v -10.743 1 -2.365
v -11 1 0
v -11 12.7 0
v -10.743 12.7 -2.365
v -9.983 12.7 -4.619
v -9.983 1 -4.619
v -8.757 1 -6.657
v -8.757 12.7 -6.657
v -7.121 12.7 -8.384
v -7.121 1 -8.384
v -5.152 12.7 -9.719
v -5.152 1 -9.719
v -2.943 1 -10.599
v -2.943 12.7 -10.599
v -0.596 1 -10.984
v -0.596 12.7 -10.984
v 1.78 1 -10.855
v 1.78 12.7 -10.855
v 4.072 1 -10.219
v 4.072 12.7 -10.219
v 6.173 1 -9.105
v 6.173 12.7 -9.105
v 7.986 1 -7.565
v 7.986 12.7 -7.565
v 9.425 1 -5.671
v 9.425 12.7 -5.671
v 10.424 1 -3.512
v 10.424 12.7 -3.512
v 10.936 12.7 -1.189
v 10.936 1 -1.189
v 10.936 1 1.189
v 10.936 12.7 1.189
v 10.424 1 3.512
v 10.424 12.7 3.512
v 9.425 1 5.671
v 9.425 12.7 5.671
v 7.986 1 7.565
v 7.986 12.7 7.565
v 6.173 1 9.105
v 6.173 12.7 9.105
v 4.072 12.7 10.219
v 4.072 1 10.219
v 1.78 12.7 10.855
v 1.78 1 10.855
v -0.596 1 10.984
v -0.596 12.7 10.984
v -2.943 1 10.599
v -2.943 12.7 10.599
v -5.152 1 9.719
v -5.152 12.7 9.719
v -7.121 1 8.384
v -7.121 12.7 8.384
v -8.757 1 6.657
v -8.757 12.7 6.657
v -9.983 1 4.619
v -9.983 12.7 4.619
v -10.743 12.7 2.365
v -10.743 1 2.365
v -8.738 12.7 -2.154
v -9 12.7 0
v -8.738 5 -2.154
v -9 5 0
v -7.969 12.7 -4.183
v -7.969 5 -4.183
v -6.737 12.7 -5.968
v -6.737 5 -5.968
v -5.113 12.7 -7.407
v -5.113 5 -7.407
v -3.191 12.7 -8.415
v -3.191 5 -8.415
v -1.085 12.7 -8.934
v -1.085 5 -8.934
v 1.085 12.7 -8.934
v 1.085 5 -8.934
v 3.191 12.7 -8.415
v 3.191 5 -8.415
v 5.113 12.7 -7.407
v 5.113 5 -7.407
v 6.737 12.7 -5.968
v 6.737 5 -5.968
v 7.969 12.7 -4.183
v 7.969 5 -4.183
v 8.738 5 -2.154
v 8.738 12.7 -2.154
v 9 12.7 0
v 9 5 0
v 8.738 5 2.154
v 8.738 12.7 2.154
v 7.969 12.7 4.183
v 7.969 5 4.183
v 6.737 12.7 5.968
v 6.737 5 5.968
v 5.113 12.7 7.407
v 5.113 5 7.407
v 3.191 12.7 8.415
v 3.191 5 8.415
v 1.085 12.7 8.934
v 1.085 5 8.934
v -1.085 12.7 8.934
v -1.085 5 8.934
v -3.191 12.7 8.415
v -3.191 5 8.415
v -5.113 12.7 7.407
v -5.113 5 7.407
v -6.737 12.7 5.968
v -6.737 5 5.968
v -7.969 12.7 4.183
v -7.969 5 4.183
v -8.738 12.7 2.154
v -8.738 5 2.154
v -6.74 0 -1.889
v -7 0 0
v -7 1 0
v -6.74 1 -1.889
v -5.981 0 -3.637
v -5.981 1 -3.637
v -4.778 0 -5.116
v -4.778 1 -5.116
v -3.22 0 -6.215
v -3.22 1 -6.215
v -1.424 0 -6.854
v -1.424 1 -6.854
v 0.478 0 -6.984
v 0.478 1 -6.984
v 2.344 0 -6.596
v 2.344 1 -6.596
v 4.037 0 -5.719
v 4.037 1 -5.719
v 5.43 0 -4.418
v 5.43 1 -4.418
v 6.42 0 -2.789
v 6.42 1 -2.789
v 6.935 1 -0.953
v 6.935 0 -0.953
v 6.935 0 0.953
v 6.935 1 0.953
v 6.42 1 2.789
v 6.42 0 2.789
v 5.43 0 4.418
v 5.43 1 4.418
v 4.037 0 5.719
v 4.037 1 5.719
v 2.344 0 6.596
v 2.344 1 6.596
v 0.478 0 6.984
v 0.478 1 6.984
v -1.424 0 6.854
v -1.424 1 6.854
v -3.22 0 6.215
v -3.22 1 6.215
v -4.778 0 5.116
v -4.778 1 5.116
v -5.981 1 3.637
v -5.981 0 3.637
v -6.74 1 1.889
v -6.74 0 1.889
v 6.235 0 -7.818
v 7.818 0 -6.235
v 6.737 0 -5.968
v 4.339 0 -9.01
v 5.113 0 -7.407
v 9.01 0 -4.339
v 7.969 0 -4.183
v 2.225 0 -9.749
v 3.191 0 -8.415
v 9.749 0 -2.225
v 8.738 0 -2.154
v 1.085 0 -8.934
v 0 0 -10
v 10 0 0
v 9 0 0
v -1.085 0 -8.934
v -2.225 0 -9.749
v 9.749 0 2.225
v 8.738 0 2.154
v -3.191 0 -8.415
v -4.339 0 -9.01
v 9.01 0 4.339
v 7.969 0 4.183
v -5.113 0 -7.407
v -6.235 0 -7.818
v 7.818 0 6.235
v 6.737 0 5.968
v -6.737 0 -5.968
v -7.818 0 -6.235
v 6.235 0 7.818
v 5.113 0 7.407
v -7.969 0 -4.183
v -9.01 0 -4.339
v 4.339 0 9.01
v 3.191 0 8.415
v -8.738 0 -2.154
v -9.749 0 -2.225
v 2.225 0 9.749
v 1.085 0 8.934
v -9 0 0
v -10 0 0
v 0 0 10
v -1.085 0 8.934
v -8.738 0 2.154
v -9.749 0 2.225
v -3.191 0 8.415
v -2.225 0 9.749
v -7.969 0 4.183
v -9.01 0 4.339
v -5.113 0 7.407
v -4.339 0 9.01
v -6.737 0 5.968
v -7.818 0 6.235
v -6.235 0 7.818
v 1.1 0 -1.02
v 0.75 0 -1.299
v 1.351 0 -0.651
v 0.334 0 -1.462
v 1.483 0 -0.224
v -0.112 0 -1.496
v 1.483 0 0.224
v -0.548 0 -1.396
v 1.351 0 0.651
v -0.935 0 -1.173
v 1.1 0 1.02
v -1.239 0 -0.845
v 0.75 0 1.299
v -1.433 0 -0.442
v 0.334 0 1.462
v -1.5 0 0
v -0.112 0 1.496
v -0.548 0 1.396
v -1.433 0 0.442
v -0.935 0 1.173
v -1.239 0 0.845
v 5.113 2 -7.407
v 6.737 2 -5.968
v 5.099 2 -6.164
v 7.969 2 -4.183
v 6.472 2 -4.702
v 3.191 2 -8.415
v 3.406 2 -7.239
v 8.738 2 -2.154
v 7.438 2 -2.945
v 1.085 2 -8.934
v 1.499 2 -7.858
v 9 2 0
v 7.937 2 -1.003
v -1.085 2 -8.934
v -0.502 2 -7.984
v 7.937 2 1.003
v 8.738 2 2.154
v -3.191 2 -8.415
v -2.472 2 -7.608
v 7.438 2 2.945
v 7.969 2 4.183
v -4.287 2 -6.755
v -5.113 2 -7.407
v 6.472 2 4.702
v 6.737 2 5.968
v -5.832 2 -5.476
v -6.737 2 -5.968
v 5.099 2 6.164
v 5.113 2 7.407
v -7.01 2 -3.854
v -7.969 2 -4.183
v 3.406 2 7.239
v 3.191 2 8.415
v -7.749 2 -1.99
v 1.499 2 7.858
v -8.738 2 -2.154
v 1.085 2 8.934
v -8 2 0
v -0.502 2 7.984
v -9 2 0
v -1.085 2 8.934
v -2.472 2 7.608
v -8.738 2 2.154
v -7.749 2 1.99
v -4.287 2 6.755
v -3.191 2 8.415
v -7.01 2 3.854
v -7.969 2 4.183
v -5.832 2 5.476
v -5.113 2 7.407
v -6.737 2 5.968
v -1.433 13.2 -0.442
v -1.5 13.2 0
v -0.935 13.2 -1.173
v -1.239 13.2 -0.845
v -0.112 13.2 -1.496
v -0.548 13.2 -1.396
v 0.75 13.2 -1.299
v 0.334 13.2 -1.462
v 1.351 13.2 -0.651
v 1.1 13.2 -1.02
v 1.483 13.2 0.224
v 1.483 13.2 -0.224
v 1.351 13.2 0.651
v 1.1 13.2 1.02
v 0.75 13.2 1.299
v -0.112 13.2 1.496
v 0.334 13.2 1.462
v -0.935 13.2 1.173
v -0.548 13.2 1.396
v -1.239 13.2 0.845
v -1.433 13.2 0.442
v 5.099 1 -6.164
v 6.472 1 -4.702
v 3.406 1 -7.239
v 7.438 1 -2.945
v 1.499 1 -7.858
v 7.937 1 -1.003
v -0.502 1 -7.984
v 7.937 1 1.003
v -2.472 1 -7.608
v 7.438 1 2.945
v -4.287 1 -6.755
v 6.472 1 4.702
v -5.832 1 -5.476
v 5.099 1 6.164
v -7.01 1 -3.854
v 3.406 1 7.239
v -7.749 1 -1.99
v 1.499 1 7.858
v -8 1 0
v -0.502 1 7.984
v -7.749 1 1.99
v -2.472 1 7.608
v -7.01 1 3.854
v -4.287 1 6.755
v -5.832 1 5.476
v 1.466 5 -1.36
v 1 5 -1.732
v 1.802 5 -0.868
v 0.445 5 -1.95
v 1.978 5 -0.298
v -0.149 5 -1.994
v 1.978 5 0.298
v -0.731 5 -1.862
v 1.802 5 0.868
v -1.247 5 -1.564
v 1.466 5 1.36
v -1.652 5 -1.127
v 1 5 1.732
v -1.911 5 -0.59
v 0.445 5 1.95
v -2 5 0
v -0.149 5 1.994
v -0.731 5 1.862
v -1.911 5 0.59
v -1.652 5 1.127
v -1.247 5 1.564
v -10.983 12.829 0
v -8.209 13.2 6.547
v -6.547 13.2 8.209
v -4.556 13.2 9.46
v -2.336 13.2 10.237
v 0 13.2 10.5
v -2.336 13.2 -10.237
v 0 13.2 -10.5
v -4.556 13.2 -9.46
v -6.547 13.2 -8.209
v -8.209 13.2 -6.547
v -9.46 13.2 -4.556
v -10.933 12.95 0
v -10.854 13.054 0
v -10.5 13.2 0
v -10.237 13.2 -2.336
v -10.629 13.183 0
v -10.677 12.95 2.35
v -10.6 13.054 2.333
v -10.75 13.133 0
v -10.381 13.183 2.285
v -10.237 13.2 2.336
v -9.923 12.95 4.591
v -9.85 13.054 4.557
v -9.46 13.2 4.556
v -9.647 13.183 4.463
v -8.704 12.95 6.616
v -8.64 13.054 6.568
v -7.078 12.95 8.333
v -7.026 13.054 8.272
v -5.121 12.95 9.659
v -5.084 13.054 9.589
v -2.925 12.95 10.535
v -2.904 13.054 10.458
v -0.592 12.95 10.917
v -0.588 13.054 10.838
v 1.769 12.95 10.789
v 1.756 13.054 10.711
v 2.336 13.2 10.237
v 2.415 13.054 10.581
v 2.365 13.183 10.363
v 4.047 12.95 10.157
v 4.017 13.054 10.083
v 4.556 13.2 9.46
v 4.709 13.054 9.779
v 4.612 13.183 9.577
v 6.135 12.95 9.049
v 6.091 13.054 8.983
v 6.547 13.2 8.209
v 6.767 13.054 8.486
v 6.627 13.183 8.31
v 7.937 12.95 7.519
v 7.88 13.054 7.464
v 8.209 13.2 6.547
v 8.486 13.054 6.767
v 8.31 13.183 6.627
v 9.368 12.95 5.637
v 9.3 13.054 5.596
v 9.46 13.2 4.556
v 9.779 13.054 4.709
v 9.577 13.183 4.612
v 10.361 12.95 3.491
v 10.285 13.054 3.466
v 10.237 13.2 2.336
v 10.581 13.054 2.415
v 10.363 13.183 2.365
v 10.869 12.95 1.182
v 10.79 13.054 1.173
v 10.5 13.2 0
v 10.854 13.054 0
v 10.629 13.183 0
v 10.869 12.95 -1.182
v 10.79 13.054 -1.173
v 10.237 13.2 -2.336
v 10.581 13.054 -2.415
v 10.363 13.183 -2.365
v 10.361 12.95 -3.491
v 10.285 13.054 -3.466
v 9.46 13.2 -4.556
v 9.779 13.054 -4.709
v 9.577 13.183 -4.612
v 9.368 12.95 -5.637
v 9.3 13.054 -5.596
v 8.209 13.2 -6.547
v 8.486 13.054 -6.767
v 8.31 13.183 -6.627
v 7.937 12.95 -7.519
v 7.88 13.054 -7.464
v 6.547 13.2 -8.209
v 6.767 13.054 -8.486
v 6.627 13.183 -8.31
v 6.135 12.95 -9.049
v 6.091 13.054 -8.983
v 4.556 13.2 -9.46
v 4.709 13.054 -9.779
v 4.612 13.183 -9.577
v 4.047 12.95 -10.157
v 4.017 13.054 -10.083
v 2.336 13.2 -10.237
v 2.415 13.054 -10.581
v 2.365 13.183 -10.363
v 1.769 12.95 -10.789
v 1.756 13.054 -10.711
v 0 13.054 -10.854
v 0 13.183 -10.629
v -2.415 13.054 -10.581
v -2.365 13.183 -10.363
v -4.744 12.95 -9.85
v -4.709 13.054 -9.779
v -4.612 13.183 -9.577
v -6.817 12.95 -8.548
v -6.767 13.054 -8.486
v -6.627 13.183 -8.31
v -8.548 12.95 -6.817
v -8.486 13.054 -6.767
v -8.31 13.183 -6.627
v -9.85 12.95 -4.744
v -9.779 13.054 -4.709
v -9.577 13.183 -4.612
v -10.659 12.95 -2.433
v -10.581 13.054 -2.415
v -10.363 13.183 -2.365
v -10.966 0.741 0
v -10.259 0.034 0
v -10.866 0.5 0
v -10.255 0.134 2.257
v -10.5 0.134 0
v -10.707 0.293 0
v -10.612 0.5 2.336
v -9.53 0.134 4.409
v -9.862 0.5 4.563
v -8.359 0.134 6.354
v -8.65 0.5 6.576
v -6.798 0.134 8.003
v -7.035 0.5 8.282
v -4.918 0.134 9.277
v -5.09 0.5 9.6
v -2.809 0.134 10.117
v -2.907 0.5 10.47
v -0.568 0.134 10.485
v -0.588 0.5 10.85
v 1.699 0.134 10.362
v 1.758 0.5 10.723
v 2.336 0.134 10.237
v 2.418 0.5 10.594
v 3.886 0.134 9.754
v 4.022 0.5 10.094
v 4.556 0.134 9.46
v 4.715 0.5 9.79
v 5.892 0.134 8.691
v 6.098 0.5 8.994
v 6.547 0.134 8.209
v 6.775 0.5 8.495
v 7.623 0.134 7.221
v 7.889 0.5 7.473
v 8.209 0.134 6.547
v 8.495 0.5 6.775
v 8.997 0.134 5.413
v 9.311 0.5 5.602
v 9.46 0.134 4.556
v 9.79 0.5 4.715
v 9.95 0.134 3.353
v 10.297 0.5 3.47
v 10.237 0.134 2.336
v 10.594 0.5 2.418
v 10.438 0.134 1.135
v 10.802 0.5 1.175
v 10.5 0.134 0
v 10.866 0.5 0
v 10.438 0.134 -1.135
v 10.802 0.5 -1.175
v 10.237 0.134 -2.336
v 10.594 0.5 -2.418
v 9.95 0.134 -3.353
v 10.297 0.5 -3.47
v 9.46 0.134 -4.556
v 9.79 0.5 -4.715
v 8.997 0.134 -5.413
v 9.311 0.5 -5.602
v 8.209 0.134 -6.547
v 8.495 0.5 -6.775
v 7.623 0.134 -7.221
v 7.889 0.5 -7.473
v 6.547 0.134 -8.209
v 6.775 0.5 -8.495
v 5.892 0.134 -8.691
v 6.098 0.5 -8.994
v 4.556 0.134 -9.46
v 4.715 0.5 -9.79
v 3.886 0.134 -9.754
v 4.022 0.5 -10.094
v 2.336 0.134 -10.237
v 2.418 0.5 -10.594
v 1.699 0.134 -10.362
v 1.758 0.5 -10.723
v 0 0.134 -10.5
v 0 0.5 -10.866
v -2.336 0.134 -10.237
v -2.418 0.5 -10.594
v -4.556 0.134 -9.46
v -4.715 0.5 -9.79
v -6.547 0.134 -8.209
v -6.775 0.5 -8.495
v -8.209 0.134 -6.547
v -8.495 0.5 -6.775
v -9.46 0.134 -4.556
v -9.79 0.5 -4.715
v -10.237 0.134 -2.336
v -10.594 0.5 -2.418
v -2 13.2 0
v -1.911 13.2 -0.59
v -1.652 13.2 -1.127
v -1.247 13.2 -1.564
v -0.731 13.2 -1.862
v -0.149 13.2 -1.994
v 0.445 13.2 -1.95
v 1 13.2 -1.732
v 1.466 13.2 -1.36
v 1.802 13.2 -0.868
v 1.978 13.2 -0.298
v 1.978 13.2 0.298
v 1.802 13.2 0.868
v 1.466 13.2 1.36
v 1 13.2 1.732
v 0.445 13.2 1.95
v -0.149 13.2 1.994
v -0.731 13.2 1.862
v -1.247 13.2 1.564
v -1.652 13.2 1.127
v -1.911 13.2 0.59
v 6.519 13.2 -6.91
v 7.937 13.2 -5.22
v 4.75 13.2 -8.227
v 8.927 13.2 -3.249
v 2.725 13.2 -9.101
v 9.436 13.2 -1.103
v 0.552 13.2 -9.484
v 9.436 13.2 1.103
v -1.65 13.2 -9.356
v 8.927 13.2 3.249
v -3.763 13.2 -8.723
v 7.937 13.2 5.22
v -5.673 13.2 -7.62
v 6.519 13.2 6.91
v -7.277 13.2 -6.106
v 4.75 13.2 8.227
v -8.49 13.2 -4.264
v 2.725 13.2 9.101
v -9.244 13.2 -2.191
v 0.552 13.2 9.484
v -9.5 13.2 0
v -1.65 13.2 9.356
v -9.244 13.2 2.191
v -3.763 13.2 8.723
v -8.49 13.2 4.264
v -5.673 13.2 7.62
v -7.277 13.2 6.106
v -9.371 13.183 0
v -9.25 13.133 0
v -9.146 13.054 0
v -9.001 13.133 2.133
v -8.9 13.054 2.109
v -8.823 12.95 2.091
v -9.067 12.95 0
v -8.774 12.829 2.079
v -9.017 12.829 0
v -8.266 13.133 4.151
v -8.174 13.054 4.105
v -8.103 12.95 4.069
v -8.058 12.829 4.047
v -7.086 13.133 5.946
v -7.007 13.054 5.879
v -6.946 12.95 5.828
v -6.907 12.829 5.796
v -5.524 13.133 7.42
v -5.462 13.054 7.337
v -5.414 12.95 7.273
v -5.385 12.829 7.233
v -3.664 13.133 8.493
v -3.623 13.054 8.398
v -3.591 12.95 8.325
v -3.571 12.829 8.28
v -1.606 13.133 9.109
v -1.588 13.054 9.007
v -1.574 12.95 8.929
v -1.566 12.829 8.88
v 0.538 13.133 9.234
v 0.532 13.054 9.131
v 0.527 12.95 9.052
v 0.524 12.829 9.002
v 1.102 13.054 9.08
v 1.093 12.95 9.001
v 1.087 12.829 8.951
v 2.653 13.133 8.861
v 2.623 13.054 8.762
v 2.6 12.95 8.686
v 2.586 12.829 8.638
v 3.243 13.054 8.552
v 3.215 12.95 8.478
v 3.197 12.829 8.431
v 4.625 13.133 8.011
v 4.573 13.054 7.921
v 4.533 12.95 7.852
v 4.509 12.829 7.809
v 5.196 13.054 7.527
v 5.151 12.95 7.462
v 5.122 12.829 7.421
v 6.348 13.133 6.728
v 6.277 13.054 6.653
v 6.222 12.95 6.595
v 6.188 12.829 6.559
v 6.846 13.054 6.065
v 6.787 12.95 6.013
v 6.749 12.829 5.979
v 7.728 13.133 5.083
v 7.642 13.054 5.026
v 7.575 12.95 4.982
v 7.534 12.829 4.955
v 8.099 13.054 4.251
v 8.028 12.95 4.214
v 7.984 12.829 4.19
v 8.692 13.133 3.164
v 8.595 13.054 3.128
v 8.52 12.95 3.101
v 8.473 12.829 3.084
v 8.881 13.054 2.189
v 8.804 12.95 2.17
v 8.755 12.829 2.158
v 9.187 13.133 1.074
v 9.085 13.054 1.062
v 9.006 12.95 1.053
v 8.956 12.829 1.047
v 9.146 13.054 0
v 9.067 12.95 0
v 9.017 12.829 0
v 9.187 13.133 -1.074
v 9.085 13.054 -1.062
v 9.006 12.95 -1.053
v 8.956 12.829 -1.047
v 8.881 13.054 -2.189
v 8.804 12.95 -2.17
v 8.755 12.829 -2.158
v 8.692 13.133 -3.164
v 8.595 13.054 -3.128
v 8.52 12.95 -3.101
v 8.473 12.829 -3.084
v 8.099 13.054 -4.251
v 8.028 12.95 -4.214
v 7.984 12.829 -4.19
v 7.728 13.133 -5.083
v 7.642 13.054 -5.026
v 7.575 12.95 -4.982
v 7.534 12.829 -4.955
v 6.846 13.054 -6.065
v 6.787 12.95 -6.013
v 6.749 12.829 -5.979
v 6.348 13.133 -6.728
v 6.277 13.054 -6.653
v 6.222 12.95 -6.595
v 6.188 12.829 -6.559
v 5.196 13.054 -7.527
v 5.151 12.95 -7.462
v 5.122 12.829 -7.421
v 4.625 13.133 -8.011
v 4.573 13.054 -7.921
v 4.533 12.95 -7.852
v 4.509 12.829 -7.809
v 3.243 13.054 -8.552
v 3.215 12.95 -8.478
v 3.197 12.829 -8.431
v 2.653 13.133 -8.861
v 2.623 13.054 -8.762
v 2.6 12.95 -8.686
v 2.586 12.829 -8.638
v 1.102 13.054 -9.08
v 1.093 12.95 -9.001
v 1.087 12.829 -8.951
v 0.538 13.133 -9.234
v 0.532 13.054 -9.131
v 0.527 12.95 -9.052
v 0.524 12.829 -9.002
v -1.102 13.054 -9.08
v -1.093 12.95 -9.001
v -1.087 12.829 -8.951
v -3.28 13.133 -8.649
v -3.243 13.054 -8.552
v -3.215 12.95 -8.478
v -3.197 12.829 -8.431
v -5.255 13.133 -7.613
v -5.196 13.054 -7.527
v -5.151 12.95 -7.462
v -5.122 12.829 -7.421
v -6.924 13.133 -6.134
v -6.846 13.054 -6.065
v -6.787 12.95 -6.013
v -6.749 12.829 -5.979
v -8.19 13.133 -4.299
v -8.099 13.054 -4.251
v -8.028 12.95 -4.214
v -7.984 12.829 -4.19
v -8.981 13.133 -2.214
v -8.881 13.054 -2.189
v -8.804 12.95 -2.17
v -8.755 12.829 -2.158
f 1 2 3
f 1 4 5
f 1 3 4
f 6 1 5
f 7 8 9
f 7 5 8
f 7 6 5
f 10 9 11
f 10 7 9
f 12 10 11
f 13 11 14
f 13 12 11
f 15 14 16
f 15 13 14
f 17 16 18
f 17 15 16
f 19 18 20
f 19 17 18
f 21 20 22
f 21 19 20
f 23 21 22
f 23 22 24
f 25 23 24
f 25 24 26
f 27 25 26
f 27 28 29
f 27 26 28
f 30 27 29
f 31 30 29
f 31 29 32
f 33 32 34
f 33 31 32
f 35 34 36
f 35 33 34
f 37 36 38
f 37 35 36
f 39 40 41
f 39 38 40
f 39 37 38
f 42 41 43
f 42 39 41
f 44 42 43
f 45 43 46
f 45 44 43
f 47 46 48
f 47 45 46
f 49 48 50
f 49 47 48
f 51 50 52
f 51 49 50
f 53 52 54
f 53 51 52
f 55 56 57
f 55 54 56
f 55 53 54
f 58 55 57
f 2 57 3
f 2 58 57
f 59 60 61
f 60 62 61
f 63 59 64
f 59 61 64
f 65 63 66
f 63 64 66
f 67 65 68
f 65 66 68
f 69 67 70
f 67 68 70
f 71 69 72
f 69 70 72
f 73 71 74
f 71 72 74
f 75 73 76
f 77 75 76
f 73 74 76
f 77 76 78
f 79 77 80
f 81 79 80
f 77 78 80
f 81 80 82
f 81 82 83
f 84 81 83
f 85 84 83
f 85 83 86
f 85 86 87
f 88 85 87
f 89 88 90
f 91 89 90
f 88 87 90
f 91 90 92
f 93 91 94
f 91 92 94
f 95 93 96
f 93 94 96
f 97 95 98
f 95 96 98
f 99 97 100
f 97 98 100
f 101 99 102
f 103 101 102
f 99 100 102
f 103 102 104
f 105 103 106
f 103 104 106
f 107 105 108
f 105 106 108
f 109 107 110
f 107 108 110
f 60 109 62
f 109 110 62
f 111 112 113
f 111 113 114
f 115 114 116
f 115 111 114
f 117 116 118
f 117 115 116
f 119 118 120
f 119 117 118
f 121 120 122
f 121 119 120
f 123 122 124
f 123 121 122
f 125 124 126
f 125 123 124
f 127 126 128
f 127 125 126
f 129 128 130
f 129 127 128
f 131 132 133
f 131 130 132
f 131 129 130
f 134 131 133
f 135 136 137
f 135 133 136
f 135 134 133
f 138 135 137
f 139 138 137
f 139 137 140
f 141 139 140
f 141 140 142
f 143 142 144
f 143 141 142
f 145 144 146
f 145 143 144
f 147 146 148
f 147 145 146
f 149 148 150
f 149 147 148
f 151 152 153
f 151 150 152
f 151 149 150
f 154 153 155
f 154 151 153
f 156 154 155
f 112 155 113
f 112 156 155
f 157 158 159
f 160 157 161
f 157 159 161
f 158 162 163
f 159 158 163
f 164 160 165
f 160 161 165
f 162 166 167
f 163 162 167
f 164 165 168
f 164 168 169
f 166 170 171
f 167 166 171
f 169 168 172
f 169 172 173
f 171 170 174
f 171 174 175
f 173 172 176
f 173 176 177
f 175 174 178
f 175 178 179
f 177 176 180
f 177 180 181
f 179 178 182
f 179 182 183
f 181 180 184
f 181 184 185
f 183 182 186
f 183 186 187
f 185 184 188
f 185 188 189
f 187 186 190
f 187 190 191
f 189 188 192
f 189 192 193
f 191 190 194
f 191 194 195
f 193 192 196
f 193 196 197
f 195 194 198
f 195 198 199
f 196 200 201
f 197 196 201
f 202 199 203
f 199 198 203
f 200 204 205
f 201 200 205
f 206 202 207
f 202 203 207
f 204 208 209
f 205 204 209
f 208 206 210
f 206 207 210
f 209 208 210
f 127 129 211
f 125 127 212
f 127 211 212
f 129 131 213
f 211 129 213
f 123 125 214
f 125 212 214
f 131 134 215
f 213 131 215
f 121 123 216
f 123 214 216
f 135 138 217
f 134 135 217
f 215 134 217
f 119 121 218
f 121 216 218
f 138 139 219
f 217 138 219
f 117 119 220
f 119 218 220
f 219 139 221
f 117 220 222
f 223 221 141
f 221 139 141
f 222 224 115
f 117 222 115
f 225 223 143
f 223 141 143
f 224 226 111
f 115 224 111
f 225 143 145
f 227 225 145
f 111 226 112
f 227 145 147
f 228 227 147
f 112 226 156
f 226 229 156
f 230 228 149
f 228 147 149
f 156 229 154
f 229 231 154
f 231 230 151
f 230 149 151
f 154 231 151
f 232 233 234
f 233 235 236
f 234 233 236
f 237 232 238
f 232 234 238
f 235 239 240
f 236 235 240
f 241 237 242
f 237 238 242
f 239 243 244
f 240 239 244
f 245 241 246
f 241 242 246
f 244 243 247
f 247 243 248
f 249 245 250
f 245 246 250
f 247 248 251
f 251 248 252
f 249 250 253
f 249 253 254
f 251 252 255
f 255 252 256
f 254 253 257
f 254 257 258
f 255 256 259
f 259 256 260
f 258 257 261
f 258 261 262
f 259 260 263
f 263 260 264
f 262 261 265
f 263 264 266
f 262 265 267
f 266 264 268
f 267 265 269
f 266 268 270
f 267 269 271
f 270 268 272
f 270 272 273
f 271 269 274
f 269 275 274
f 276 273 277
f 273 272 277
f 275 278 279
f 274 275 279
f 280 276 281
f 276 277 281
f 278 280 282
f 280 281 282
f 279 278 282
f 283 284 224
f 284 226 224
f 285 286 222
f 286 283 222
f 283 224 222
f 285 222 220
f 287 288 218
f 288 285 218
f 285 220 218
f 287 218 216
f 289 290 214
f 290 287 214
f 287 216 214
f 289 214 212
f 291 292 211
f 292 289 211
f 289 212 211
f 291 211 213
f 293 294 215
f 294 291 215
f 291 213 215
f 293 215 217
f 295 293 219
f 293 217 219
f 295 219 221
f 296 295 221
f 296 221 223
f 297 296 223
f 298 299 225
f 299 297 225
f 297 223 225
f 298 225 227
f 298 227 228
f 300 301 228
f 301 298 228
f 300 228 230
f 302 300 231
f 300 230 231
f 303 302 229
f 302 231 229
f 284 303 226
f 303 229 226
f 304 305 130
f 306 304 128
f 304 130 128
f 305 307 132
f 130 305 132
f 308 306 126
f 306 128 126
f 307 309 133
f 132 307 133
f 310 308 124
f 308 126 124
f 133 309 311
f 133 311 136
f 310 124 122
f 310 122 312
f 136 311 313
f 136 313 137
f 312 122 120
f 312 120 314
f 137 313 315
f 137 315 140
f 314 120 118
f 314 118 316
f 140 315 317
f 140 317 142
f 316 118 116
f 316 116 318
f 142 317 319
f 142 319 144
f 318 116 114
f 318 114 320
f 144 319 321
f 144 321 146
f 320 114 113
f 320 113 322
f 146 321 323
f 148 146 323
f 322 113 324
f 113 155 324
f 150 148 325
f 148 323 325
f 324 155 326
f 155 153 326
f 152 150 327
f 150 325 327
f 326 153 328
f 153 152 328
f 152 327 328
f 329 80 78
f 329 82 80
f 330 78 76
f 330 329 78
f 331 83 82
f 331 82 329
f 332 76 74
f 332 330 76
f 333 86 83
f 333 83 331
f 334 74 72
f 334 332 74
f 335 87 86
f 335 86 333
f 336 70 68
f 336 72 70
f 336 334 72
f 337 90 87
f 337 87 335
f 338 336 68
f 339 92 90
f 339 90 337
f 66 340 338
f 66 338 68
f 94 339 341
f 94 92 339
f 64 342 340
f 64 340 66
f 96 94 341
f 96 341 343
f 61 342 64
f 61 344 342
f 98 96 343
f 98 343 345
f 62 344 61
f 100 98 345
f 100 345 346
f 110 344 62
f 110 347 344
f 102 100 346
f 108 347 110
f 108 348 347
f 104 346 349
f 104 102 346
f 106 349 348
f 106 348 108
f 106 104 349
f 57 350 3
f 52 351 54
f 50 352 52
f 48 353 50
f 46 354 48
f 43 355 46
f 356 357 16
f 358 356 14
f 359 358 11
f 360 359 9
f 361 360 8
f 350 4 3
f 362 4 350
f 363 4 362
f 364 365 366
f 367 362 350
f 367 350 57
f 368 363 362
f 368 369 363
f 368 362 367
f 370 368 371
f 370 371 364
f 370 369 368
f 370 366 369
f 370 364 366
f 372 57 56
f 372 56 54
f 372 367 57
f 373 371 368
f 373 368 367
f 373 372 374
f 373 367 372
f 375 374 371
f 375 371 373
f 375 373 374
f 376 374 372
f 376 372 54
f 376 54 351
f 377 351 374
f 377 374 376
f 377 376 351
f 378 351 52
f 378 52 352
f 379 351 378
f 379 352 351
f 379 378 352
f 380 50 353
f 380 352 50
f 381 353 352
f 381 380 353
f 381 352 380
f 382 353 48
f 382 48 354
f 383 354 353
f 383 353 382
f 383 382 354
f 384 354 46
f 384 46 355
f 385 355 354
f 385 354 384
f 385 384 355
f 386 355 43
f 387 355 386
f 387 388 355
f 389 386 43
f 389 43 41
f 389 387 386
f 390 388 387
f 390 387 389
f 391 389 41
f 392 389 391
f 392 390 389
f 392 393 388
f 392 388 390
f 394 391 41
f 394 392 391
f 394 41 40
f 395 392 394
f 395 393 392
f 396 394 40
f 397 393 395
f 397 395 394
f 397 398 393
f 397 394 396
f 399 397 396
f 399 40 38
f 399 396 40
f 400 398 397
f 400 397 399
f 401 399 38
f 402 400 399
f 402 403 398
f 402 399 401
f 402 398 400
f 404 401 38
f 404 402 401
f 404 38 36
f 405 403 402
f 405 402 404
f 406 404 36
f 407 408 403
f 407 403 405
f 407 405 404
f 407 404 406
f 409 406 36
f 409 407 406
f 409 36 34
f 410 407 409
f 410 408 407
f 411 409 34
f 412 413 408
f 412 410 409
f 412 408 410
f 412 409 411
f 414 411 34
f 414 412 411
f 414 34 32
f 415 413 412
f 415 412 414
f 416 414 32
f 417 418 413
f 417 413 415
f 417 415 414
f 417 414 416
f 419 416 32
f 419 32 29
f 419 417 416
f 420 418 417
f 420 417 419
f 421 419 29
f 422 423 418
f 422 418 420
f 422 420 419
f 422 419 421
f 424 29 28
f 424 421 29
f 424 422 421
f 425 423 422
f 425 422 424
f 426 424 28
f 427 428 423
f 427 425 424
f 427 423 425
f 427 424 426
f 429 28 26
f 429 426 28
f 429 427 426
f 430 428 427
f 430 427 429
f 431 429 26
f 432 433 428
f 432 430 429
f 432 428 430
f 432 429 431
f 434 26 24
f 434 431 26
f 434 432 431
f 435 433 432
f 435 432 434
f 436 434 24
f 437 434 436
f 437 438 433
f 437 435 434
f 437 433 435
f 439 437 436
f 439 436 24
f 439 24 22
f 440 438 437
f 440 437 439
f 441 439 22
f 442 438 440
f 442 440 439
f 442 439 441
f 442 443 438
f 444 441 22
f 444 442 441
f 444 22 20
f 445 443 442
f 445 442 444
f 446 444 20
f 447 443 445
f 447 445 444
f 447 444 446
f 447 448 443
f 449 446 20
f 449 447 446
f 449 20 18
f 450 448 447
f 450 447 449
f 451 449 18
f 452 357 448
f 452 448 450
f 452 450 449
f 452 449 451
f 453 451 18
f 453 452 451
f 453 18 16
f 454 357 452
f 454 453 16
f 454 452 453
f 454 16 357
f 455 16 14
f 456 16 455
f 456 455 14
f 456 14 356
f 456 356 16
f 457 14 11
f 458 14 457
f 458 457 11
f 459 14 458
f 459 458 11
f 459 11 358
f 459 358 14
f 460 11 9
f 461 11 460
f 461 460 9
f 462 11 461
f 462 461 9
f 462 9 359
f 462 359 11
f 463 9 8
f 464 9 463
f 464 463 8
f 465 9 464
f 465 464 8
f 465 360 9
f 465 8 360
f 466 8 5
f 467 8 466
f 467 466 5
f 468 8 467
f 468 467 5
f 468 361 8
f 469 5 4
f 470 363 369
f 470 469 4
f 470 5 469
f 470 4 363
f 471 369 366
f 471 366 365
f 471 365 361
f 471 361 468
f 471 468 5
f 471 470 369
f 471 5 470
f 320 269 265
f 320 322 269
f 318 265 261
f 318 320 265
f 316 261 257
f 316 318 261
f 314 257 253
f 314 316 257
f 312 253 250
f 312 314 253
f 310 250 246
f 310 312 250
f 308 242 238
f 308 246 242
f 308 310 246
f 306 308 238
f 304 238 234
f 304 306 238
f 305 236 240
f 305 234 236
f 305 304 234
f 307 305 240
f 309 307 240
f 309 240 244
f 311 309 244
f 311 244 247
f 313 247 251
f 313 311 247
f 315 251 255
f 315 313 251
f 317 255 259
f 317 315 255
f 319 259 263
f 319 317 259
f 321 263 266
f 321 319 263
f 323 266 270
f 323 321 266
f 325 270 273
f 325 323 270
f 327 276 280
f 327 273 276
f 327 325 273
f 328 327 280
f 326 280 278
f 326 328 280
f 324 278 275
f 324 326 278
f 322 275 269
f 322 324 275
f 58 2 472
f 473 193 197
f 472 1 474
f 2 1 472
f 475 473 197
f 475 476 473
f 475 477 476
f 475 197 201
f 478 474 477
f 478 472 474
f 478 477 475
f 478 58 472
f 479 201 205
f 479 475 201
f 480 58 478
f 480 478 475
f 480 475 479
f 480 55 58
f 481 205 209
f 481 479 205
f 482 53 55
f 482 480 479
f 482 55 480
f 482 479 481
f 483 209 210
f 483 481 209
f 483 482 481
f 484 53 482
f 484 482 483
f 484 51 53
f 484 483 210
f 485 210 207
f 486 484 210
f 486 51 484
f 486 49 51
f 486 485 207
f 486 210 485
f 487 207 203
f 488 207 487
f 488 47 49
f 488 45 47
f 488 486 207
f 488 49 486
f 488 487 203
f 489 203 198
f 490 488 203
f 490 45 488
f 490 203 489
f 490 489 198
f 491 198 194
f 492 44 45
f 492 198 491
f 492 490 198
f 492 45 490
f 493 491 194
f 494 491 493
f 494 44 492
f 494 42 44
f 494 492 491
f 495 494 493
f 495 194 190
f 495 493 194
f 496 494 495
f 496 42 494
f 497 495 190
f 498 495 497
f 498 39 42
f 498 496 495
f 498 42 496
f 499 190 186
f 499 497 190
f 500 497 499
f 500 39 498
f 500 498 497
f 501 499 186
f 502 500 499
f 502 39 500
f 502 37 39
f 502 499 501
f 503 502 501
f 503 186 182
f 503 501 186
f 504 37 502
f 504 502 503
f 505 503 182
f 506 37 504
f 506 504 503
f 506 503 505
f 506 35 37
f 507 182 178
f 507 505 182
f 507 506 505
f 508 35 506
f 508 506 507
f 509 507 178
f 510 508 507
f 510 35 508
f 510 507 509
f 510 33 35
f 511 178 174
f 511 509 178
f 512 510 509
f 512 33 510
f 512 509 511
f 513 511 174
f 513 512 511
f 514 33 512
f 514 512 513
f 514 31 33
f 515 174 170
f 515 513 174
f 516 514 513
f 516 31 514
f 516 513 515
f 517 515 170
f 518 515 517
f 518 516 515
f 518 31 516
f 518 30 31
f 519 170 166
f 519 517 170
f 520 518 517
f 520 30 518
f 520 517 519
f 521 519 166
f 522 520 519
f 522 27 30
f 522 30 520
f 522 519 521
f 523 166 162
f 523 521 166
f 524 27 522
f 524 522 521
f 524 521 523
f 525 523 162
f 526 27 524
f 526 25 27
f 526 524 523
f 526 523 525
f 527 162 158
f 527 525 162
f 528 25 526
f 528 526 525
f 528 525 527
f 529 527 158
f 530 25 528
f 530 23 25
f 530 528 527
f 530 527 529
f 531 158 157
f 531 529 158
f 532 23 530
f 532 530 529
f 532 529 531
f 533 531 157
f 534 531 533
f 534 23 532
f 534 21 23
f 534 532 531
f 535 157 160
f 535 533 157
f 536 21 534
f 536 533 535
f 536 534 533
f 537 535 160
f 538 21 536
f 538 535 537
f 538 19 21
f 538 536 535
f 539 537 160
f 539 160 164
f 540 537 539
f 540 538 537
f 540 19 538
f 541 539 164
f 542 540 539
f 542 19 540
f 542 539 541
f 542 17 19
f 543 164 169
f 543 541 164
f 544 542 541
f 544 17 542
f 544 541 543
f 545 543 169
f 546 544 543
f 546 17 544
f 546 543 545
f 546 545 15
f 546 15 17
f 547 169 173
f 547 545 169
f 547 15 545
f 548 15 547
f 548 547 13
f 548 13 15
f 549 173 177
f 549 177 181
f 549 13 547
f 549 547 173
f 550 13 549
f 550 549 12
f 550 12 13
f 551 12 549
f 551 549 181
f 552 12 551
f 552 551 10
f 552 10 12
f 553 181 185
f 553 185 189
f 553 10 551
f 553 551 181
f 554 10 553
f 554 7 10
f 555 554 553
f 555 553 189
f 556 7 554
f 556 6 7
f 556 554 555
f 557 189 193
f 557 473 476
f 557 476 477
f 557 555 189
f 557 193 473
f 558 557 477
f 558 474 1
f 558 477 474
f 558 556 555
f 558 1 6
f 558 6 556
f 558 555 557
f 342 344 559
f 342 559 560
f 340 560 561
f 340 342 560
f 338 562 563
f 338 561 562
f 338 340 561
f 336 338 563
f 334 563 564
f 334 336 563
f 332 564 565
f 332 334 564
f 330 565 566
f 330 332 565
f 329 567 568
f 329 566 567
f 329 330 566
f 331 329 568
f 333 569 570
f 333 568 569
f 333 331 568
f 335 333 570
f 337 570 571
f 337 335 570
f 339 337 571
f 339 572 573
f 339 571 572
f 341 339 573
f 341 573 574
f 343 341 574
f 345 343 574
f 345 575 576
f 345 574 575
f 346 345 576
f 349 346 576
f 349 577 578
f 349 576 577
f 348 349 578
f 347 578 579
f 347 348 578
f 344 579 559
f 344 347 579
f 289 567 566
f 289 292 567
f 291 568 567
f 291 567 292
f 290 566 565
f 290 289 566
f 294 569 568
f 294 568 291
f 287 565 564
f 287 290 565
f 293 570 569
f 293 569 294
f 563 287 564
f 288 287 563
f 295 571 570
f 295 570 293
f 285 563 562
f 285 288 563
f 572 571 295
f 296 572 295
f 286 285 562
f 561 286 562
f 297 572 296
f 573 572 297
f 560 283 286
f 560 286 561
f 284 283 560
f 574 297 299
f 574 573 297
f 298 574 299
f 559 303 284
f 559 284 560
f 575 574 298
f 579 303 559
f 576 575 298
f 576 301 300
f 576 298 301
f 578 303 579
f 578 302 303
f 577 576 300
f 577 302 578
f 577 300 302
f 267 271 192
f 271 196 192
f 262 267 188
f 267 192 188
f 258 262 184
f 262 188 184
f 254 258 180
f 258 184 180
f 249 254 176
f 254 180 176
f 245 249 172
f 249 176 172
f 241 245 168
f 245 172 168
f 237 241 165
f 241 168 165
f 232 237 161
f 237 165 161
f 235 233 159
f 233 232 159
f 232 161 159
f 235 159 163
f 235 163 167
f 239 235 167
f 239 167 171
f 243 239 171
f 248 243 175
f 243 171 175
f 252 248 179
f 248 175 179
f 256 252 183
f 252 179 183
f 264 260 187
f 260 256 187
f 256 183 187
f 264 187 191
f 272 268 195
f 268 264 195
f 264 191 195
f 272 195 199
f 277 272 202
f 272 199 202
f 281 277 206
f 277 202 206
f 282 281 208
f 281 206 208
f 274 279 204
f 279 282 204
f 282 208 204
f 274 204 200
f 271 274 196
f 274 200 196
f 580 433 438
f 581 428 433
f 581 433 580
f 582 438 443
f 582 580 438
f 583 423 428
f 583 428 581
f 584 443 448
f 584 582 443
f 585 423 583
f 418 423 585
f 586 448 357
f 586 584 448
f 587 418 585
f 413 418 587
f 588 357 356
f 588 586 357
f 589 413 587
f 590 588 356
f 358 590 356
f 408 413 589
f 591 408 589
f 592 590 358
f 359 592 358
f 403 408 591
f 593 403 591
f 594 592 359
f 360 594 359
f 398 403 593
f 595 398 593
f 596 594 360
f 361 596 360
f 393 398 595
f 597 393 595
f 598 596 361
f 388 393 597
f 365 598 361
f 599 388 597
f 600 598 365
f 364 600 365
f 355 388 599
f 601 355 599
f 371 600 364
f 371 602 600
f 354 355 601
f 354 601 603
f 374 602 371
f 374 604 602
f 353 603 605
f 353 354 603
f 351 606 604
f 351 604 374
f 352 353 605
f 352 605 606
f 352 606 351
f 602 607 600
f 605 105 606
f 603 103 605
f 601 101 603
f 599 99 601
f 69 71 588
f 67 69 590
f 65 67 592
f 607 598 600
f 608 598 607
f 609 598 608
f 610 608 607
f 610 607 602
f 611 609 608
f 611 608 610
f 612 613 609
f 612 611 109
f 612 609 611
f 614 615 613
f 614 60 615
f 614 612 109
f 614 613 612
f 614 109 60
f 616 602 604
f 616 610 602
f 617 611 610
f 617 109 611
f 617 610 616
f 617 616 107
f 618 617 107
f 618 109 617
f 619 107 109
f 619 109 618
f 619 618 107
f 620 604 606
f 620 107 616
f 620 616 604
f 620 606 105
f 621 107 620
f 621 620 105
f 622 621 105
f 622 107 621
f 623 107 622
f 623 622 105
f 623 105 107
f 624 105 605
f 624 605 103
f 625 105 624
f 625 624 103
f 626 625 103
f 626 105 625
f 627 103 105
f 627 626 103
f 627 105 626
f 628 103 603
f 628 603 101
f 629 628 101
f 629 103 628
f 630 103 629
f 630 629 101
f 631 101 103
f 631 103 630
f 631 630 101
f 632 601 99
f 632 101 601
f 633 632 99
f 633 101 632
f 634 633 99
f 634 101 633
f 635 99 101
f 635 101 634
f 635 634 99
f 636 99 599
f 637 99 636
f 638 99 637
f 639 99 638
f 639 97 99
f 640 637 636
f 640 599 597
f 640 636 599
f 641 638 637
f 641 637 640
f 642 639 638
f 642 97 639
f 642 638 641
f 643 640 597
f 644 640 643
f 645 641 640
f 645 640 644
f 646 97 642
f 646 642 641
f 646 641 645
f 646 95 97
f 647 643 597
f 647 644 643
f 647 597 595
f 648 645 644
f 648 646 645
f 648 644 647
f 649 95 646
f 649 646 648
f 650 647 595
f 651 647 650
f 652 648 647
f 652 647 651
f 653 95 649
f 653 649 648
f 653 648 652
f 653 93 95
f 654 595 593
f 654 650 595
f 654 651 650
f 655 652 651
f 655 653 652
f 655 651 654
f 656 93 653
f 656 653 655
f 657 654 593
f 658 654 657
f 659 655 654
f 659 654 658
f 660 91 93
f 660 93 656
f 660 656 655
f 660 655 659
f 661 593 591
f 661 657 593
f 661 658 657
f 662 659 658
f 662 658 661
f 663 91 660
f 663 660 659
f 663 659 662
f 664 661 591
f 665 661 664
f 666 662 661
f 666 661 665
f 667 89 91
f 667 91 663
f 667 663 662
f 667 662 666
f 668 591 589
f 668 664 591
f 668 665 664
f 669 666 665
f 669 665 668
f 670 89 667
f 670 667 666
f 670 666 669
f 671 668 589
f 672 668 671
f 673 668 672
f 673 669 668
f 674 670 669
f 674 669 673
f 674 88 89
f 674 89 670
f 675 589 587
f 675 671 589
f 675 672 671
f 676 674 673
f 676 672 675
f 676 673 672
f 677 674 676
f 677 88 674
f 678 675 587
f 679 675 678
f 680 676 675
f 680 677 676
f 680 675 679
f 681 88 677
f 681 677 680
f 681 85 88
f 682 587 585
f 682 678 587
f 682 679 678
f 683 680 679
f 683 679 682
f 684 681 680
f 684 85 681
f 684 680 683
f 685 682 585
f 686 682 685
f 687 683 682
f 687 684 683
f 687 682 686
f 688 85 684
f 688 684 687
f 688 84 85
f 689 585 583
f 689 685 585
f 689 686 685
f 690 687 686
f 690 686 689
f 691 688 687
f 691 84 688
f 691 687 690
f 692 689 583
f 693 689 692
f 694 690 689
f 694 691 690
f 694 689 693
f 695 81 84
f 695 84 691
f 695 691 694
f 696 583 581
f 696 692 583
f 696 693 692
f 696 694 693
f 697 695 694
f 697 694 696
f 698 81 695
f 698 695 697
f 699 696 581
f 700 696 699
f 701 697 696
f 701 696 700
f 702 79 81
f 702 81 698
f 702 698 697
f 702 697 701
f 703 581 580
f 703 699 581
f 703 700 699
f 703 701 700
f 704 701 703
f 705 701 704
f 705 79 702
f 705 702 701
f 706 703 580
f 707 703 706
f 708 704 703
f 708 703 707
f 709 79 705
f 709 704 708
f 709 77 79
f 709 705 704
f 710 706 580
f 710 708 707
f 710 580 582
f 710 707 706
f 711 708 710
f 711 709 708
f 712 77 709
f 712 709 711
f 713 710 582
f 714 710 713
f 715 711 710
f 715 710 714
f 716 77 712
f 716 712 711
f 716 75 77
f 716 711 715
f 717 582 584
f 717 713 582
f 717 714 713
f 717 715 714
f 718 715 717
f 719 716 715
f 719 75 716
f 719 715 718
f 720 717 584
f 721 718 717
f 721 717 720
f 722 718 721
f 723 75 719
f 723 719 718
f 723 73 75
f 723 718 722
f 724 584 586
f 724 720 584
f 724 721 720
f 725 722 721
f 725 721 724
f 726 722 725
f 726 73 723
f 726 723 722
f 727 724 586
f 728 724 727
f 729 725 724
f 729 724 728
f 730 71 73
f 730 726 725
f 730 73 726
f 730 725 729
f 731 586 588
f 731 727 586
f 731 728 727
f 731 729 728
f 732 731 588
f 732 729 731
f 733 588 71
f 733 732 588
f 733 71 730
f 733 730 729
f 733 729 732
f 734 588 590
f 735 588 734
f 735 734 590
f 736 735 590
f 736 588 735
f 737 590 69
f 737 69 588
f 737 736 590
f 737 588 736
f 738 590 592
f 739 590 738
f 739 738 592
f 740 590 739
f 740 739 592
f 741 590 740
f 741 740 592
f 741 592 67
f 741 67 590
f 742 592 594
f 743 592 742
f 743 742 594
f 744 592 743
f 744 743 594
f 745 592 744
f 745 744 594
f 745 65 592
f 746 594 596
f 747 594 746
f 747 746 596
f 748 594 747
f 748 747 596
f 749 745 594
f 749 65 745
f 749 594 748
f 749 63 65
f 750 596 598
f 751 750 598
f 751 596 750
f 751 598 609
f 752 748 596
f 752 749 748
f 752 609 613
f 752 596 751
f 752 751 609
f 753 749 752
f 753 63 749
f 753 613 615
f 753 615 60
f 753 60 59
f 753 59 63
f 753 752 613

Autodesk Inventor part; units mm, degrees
ref_plane "YZ Plane" through (0, 0, 0) normal (1, 0, 0) x (0, 1, 0)
ref_plane "XZ Plane" through (0, 0, 0) normal (0, 1, 0) x (-1, 0, 0)
ref_plane "XY Plane" through (0, 0, 0) normal (0, 0, 1) x (1, 0, 0)
sketch "Sketch1" plane through (0, 0, 0) normal (0, 1, 0) x (-1, 0, 0)
  circle A0 centre (0, 0) radius 11
  circle A1 centre (0, 0) radius 1.5
  circle A2 centre (0, 0) radius 2
  circle A3 centre (0, 0) radius 8
  circle A4 centre (0, 0) radius 7
  circle A5 centre (0, 0) radius 9
  dimension "d0" = 22
  dimension "d5" = 3
  dimension "d8" = 4
  dimension "d14" = 16
  dimension "d15" = 14
  dimension "d16" = 18
extrude "Extrusion1" add sketch "Sketch1" along normal blind 13.2 contours A0 | A1 | A2 | A3 | A4 | A5
shell "Shell1" thickness 2 removed faces 1 at (3.2467, 13.2, -1.704)
fillet "Fillet1" radius 0.5 3 edges at (11, 13.2, 0) (9, 13.2, 0) (11, 0, 0)
extrude "Extrusion2" cut sketch "Sketch1" along normal through all contours A1
extrude "Extrusion3" add sketch "Sketch1" along normal blind 5 contours A0 | A3 | A4 | A5
extrude "Extrusion4" add sketch "Sketch1" along normal blind 13.2 contours A2
fillet "Fillet2" radius 1 1 edges at (11, 0, 0)
extrude "Extrusion5" cut sketch "Sketch1" along normal blind 1 contours A3
extrude "Extrusion6" cut sketch "Sketch1" along normal blind 2 contours A5
properties part number "Kolo"
